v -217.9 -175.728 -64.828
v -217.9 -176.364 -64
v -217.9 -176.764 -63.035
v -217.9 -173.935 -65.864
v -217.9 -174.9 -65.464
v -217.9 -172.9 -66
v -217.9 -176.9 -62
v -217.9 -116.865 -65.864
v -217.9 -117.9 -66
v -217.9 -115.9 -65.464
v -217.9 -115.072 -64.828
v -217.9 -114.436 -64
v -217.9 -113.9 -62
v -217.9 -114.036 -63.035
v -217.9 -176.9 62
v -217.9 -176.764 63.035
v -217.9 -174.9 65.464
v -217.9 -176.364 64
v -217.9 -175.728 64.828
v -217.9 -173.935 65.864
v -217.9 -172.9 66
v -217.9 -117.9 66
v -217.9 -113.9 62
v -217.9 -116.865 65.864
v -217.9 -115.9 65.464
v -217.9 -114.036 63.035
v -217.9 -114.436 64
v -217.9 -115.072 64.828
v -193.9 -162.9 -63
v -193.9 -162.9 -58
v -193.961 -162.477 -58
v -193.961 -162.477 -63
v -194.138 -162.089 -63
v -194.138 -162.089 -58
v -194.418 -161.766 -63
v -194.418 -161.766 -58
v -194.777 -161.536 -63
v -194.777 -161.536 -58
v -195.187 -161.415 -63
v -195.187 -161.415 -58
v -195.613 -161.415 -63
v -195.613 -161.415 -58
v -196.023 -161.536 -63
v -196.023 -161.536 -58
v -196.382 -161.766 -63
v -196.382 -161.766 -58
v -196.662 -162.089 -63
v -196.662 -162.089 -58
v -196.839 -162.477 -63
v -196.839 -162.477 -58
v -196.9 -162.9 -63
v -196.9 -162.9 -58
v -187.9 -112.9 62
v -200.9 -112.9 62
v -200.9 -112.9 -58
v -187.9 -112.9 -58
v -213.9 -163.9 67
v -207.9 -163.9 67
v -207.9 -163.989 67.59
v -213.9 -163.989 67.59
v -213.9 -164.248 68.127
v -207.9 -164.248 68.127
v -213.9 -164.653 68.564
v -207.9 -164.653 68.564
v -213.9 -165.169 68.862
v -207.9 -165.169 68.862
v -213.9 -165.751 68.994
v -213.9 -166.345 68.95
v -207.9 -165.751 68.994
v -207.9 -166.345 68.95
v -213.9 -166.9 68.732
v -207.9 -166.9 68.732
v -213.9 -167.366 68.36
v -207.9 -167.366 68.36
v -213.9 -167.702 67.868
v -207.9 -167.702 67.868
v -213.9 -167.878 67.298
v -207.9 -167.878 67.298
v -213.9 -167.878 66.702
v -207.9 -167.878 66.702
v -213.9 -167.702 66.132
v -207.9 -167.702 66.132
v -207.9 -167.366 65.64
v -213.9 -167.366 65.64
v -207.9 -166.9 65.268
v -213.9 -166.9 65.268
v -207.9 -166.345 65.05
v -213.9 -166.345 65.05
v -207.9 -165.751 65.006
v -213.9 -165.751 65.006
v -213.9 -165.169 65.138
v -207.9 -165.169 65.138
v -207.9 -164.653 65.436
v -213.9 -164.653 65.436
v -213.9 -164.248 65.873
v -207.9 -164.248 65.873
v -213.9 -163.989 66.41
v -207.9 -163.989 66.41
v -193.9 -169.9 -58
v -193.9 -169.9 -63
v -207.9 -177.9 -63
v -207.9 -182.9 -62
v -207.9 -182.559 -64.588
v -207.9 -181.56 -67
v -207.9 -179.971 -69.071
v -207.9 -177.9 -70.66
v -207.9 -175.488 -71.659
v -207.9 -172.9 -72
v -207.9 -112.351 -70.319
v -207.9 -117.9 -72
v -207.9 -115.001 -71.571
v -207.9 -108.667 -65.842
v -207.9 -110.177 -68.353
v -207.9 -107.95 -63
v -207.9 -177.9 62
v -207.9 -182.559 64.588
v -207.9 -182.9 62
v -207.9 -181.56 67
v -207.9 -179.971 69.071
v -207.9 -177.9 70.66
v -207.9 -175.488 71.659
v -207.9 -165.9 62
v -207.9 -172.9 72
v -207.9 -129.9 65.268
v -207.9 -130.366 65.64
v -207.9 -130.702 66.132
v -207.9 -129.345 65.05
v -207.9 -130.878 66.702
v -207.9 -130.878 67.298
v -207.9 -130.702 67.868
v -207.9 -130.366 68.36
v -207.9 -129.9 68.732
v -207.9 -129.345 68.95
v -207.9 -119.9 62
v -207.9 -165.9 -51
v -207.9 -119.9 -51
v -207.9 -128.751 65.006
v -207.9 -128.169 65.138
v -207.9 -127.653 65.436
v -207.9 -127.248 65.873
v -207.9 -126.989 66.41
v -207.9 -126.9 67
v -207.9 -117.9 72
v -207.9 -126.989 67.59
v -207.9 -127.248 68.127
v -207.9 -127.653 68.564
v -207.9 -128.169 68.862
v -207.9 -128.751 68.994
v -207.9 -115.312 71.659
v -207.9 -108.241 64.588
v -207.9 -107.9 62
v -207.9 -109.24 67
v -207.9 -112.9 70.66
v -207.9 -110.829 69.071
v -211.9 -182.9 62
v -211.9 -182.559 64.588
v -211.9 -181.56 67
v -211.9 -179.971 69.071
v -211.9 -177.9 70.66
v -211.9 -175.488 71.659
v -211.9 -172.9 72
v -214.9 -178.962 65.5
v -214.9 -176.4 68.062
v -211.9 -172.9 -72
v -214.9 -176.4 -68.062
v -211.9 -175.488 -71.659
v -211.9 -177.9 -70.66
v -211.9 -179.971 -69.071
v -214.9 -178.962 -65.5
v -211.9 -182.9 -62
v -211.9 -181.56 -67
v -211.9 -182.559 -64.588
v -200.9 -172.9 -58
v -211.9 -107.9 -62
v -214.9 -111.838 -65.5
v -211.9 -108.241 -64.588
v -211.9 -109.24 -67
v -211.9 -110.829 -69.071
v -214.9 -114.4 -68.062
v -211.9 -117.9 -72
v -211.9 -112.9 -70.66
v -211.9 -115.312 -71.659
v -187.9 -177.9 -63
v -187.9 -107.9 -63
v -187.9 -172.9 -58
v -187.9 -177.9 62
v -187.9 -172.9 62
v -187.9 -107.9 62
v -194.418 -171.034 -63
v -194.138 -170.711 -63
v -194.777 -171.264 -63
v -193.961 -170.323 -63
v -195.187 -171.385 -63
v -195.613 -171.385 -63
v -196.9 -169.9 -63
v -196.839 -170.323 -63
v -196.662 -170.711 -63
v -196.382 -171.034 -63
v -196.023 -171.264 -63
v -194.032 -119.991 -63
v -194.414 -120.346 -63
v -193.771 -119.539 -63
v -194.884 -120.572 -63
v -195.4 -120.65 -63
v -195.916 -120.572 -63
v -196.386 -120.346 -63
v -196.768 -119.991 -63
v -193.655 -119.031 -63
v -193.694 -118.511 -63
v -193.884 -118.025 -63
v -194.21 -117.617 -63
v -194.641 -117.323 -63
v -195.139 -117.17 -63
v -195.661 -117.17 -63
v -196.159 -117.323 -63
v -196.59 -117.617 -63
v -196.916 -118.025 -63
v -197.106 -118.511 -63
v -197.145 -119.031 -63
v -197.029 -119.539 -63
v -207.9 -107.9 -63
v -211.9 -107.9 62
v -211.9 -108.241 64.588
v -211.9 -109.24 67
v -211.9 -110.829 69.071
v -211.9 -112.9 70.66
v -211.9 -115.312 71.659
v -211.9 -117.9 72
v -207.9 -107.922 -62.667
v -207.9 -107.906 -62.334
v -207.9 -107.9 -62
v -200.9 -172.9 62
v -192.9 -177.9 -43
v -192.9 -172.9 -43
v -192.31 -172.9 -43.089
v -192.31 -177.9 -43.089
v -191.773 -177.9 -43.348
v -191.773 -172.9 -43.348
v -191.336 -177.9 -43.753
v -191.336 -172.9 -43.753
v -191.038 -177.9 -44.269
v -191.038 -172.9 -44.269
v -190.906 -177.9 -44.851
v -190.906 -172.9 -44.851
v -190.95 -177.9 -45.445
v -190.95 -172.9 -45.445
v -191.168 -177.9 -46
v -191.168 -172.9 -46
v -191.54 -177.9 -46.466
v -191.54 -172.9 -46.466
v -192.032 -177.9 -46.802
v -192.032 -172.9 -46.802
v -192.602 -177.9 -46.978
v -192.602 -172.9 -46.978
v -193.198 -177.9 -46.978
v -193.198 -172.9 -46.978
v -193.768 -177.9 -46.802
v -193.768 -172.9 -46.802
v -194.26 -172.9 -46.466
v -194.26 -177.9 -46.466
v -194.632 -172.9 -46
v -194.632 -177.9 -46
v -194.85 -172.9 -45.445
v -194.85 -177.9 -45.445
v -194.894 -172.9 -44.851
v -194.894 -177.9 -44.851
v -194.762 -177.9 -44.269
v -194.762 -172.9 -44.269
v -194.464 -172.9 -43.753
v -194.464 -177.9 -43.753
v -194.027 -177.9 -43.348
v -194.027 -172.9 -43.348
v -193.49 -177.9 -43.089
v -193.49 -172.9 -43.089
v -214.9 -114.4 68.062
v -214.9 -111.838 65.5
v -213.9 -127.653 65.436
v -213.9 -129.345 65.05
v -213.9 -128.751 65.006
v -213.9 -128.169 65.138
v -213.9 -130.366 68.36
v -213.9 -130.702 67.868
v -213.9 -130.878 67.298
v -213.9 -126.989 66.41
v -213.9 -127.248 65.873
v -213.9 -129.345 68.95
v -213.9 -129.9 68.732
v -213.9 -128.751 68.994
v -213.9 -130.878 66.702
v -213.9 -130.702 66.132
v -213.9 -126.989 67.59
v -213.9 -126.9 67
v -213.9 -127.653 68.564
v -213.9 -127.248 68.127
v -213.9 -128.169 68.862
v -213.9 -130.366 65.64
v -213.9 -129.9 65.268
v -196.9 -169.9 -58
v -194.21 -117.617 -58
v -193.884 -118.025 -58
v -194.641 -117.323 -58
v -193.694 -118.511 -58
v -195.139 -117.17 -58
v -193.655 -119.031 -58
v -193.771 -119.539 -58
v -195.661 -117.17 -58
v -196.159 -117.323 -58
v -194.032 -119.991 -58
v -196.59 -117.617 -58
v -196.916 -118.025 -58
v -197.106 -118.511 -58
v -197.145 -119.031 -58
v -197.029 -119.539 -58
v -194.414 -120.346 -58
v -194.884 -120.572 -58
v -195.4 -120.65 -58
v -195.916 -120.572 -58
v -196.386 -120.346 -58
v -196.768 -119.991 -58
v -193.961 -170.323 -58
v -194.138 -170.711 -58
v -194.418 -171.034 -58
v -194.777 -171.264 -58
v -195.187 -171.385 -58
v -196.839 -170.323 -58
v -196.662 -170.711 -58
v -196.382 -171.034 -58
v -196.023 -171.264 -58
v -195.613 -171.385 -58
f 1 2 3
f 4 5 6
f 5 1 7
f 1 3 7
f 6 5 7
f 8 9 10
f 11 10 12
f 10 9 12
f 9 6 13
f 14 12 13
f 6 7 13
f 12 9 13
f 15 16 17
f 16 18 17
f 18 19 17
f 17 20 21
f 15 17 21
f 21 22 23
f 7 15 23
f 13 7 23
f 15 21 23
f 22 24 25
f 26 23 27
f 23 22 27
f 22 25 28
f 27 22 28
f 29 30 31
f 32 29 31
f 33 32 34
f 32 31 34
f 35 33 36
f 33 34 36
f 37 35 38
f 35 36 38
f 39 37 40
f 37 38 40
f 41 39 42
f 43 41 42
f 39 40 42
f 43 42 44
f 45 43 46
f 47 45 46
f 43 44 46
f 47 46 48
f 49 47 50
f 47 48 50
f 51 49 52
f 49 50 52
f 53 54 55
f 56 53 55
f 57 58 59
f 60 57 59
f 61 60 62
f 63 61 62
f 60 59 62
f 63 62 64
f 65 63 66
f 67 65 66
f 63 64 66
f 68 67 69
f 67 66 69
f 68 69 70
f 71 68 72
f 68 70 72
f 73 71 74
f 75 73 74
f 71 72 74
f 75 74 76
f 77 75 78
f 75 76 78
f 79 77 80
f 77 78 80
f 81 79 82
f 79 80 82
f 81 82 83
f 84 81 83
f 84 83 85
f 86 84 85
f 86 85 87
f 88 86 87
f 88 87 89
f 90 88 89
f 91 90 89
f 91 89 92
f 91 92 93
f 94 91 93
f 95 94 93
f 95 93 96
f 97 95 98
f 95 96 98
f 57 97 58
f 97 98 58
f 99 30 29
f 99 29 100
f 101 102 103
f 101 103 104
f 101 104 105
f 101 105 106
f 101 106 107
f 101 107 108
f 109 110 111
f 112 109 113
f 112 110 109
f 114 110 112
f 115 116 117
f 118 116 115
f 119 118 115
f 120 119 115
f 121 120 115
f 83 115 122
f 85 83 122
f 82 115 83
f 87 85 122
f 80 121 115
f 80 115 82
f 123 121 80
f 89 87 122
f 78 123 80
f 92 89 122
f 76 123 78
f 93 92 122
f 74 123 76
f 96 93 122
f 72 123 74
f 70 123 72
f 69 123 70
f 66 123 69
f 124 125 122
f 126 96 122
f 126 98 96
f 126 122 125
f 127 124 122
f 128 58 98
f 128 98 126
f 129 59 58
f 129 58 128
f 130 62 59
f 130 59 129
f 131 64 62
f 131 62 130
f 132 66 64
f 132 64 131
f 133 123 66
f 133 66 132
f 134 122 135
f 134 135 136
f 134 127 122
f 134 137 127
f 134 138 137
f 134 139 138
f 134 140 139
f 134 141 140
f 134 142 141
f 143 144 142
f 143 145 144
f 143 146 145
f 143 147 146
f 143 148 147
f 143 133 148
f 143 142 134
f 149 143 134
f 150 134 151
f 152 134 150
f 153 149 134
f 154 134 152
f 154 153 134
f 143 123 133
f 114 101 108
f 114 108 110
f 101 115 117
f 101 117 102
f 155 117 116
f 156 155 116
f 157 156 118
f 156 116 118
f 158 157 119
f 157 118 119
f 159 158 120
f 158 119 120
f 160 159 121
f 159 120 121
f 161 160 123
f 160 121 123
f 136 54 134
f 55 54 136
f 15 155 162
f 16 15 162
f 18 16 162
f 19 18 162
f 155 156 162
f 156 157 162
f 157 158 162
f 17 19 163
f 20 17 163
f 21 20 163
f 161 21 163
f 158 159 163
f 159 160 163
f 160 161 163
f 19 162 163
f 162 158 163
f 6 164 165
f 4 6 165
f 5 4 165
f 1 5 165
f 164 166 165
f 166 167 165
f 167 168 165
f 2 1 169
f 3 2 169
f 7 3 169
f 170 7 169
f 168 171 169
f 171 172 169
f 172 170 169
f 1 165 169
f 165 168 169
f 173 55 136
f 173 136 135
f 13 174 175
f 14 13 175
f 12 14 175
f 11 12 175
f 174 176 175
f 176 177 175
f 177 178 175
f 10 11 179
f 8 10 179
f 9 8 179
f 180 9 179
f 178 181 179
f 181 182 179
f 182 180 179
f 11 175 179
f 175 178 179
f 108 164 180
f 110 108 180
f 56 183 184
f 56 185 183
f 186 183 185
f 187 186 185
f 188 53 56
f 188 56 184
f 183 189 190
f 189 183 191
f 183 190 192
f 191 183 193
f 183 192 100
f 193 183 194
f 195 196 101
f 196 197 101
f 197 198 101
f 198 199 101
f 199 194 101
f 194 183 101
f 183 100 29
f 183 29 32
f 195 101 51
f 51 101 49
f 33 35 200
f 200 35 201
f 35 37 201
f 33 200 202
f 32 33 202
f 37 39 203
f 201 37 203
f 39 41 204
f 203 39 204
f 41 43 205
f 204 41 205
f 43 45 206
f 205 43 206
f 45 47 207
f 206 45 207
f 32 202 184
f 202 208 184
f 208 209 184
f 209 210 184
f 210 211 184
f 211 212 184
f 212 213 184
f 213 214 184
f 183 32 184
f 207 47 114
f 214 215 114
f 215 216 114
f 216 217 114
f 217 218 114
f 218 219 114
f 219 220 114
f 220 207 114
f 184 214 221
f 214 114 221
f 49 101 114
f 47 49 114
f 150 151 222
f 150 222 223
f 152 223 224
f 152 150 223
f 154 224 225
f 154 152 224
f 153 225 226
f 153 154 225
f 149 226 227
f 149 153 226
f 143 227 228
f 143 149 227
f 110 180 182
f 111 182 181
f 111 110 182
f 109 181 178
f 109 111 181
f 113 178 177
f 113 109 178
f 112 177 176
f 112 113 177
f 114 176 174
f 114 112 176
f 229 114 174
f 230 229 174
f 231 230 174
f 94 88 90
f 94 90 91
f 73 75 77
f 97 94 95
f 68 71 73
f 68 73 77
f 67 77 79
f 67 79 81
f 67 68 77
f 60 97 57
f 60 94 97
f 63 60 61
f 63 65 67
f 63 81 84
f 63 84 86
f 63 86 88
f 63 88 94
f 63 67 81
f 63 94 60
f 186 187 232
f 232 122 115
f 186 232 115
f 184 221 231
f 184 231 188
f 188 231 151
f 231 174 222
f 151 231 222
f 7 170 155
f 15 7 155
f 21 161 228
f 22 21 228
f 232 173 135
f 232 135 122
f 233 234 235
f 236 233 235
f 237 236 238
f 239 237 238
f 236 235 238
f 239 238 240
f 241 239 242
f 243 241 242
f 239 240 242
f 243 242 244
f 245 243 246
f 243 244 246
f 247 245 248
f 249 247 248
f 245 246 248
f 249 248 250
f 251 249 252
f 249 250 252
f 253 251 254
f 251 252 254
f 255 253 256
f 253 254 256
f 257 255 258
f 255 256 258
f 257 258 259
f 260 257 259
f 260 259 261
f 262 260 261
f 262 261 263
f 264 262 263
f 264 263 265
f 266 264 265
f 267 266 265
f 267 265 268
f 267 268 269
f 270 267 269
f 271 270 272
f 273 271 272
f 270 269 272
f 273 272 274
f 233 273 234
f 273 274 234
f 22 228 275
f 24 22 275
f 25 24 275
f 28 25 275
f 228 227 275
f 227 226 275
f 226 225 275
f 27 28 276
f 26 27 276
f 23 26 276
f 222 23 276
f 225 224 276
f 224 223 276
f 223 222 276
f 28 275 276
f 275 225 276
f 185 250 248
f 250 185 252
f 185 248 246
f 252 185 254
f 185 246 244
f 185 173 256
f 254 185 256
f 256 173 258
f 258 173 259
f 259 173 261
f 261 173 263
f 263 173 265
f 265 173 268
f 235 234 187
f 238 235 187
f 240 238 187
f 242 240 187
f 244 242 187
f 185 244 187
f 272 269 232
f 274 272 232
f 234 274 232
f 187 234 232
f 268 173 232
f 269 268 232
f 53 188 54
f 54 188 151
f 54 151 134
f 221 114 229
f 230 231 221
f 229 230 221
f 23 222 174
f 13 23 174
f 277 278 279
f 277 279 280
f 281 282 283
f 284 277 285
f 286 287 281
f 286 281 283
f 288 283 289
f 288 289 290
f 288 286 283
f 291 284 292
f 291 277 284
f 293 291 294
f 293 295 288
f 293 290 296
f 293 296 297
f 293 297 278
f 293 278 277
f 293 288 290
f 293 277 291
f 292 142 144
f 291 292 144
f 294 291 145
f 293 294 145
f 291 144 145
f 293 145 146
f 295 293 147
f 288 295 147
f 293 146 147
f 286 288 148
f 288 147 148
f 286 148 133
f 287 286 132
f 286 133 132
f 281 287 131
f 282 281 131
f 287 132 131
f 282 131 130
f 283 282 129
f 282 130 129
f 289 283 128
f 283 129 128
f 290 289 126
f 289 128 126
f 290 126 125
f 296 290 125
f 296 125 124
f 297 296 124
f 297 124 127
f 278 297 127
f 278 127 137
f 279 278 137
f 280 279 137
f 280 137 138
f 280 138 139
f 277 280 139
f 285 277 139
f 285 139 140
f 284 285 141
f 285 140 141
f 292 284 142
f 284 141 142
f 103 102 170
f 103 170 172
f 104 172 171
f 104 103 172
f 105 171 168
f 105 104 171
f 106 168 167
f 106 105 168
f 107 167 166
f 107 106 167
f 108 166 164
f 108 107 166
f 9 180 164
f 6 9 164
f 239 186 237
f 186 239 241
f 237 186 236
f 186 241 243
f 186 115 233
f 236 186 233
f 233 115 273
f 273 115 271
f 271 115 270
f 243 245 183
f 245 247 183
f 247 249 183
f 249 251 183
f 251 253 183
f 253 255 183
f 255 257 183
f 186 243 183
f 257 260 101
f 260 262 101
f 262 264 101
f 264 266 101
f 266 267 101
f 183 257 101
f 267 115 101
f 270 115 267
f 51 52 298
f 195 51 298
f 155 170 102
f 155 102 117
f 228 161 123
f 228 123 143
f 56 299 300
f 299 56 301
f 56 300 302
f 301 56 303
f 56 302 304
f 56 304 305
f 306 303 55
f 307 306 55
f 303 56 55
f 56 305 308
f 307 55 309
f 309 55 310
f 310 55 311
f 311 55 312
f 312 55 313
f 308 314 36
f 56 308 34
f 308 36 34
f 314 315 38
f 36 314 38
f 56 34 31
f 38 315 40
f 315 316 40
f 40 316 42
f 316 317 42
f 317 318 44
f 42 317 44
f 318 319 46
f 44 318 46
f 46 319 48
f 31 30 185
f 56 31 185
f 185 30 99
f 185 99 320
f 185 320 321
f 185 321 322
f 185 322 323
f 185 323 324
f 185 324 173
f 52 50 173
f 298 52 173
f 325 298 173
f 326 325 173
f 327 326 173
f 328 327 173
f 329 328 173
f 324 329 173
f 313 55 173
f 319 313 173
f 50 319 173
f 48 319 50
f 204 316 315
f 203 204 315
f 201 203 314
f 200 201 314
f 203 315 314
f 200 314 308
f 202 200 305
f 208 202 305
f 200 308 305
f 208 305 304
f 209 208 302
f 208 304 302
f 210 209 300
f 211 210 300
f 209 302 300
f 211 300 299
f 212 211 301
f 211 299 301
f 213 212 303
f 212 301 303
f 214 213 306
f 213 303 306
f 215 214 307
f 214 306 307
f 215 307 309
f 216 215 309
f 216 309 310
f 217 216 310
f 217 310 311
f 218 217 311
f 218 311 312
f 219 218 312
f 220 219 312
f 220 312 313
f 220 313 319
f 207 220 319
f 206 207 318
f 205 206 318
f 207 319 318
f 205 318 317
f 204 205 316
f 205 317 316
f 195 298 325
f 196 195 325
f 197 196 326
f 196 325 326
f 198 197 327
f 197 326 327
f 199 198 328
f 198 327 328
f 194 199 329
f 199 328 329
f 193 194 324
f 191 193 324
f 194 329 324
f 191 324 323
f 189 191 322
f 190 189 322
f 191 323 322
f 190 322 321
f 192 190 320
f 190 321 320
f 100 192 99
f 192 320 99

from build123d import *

# Parameters (mm, degrees)
SKETCH165_W     = 75
SKETCH165_H     = 144
PAD045_DEPTH    = 10
FILLET025_R     = 10
CHAMFER010_SIZE = 6
SKETCH166_R     = 2
POCKET056_DEPTH = 6
PAD046_DEPTH    = 20
SKETCH169_R     = 1.75
POCKET057_DEPTH = 5
CHAMFER011_SIZE = 7
SKETCH172_R     = 2
POCKET059_DEPTH = 5


with BuildPart() as part:
    # Sketch165 → Pad045 (new body)
    with BuildSketch(Plane.YZ):
        with Locations((5.5, 0)):
            Rectangle(SKETCH165_W, SKETCH165_H)
    extrude(amount=PAD045_DEPTH)

    # Fillet025
    fillet025_edges = [part.edges().sort_by_distance(p)[0] for p in [
        (5, 43, -72),
        (5, -32, -72),
        (5, -32, 72),
        (5, 43, 72),
    ]]
    fillet(fillet025_edges, radius=FILLET025_R)

    # Chamfer010
    chamfer010_edges = [part.edges().sort_by_distance(p)[0] for p in [
        (0, 5.5, 72),
        (0, -32, 0),
        (0, 43, 0),
        (0, 5.5, -72),
    ]]
    chamfer(chamfer010_edges, length=CHAMFER010_SIZE)

    # Sketch166 (on Face4 of Chamfer010) → Pocket056 (cut)
    with BuildSketch(Plane.YZ.offset(10)):
        with Locations((-15, 67)):
            Circle(SKETCH166_R)
        with Locations((22, 67)):
            Circle(SKETCH166_R)
    extrude(amount=-POCKET056_DEPTH, mode=Mode.SUBTRACT)

    # Sketch167 (on Face4 of Pocket056) → Pad046 (join)
    with BuildSketch(Plane.YZ.offset(10)):
        Polygon((-27, 62), (-27, -63), (43, -63), (43, 62), (38, 62), (38, -58), (-22, -58), (-22, 62), align=None)
    extrude(amount=PAD046_DEPTH)

    # Sketch169 (on Face13 of Pad046) → Pocket057 (cut)
    with BuildSketch(Plane(origin=(0, 0, -58), x_dir=(0, -1, 0), z_dir=(0, 0, 1))):
        with Locations((-32, 22.5)):
            Circle(SKETCH169_R)
        with BuildLine():
            ThreePointArc((12, 24), (10.5, 22.5), (12, 21))
            Line((12, 21), (19, 21))
            ThreePointArc((19, 21), (20.5, 22.5), (19, 24))
            Line((12, 24), (19, 24))
        make_face()
    extrude(amount=-POCKET057_DEPTH, mode=Mode.SUBTRACT)

    # Chamfer011
    chamfer011_edges = [part.edges().sort_by_distance(p)[0] for p in [
        (10, 8, -58),
        (10, -22, 2),
        (10, 38, 2),
    ]]
    chamfer(chamfer011_edges, length=CHAMFER011_SIZE)

    # Sketch172 (on Face18 of Chamfer011) → Pocket059 (cut)
    with BuildSketch(Plane.ZX.offset(-22)):
        with Locations((-45, 25)):
            Circle(SKETCH172_R)
    extrude(amount=-POCKET059_DEPTH, mode=Mode.SUBTRACT)


with BuildPart() as part_1:
    # Body016 placement: moved
    add(part.part.moved(Location((-217.9, -150.9, 0))))


solid = part_1.part
